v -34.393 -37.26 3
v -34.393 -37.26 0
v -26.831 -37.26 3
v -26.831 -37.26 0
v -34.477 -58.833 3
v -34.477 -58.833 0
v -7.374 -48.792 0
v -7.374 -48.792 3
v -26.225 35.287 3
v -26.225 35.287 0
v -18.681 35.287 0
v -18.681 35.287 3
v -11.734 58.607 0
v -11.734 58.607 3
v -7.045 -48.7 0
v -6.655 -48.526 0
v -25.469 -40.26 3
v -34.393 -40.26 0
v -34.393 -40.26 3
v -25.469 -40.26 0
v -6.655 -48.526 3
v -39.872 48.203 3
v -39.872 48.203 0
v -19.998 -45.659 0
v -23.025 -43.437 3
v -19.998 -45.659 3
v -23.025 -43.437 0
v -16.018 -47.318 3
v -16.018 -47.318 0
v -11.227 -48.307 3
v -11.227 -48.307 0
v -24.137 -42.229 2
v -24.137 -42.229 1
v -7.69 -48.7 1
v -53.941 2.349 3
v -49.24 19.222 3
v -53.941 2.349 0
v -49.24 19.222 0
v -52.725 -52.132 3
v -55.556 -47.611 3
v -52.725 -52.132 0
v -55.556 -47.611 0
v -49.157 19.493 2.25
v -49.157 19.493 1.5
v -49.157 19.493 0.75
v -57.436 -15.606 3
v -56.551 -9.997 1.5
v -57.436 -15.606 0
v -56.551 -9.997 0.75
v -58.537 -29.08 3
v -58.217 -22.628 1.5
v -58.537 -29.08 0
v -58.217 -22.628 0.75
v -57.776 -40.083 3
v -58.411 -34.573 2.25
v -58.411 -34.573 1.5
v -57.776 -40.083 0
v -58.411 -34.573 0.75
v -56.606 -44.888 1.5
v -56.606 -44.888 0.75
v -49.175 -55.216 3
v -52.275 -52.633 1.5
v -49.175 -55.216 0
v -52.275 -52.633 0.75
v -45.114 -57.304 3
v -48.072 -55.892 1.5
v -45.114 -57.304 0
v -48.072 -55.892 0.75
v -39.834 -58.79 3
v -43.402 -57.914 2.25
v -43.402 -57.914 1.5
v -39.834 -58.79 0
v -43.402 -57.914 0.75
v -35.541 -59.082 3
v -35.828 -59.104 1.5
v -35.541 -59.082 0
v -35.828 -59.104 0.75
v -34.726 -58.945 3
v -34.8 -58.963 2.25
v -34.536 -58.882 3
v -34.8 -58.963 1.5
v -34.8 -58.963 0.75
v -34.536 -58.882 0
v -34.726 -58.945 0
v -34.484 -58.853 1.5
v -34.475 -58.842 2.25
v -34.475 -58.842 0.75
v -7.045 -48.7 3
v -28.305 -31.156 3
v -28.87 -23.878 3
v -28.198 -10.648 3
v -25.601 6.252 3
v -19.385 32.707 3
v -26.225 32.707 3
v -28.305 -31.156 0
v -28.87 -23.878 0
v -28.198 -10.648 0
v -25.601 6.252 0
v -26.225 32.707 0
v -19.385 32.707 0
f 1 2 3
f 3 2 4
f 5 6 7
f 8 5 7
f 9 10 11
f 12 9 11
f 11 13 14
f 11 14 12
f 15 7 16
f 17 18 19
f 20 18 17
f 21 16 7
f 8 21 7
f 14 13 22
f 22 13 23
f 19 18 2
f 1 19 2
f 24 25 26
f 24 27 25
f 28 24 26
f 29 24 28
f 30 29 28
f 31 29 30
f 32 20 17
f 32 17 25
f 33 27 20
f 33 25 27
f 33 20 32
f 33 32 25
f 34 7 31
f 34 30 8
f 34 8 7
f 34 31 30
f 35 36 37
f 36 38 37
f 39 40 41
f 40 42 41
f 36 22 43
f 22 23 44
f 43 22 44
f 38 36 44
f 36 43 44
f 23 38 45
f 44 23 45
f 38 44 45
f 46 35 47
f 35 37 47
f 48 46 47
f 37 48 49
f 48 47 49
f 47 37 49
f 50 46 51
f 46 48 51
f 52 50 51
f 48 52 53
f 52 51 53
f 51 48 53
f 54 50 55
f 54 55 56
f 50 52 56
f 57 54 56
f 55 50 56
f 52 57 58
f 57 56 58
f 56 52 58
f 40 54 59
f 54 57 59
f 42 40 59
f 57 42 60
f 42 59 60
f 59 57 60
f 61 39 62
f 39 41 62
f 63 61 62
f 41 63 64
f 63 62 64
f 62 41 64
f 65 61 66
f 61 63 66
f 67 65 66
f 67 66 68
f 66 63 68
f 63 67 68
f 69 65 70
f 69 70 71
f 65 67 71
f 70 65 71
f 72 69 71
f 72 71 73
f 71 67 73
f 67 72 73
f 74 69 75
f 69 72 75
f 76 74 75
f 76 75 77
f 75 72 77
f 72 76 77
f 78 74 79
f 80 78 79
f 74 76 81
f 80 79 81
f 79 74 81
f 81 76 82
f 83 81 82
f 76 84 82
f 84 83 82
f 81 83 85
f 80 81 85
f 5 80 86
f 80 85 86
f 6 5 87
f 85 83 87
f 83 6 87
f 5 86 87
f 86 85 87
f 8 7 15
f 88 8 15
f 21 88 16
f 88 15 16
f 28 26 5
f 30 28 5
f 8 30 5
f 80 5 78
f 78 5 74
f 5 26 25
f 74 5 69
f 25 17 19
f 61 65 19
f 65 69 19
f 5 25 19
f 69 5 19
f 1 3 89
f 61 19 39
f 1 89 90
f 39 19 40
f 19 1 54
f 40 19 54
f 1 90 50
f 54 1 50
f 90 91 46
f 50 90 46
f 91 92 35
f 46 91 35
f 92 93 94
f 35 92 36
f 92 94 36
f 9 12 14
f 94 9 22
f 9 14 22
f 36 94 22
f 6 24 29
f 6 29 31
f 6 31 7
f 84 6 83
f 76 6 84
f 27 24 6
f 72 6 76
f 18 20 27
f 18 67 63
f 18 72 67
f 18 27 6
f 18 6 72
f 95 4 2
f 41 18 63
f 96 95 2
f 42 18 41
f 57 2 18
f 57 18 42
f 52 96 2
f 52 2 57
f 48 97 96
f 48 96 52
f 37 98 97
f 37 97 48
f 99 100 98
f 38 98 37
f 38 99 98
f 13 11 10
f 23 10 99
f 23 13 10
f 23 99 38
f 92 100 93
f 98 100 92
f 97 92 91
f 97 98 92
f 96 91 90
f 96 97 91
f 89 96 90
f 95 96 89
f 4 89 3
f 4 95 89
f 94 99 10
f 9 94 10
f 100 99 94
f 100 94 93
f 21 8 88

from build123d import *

# Parameters (mm, degrees)
F1_DEPTH = 3
F2_W     = 16
F2_H     = 2.5804279571
F3_DEPTH = 3
F4_W     = 16
F4_H     = 3
F5_DEPTH = 3


with BuildPart() as f1:
    # F0 (on Top) → F1 (new body)
    with BuildSketch(Plane.XY):
        with BuildLine():
            Line((-6.6545552854, -48.5257102785), (-7.3743865095, -48.7923928835))
            add(Edge.make_bspline(
                [(-7.3743865095, -48.7923928835), (-7.3463953032, -48.7904084122), (-7.1800733819, -48.761723798), (-6.8120666556, -48.6123548112), (-6.6545552854, -48.5257102785)],
                knots=[0.9373684974, 0.9373684974, 0.9373684974, 0.9373684974, 0.945342946, 0.9777580666, 0.9777580666, 0.9777580666, 0.9777580666], degree=3))
        make_face()
    extrude(amount=F1_DEPTH)


with BuildPart() as f1b:
    # F0 (on Top) → F1, piece 2 (new body)
    with BuildSketch(Plane.XY):
        with BuildLine():
            add(Edge.make_bspline(
                [(-11.734207112, 58.6074007301), (-21.772819408, 27.0492546374), (-42.7474558666, -49.3541198531), (-7.7835553334, -48.2996819233), (-7.4910280261, -48.8006623284), (-7.3743865095, -48.7923928835)],
                knots=[0, 0, 0, 0, 0.6380265616, 0.9041383546, 0.9373684974, 0.9373684974, 0.9373684974, 0.9373684974], degree=3))
            Line((-11.734207112, 58.6074007301), (-39.8722687706, 48.2030994032))
            add(Edge.make_bspline(
                [(-39.8722687706, 48.2030994032), (-45.9248216711, 29.1758331799), (-58.9903870118, -6.0049413166), (-60.2537886956, -55.7164680185), (-36.7203376896, -59.6866463577), (-34.4327324858, -58.8729046374), (-34.4770574691, -58.8333728399)],
                knots=[0, 0, 0, 0, 0.3846835999, 0.7083151359, 0.9161591015, 0.9741914032, 0.9741914032, 0.9741914032, 0.9741914032], degree=3))
            Line((-34.4770574691, -58.8333728399), (-7.3743865095, -48.7923928835))
        make_face()
    extrude(amount=F1_DEPTH)

    # F2 (on Top) → F3 (cut)
    with BuildSketch(Plane.XY):
        with Locations((-18.2248428464, 33.9970178902)):
            Rectangle(F2_W, F2_H)
    extrude(amount=F3_DEPTH, mode=Mode.SUBTRACT)

    # F4 (on Top) → F5 (cut)
    with BuildSketch(Plane.XY):
        with Locations((-26.392986998, -38.759931922)):
            Rectangle(F4_W, F4_H)
    extrude(amount=F5_DEPTH, mode=Mode.SUBTRACT)


solid = Compound([f1.part, f1b.part])
